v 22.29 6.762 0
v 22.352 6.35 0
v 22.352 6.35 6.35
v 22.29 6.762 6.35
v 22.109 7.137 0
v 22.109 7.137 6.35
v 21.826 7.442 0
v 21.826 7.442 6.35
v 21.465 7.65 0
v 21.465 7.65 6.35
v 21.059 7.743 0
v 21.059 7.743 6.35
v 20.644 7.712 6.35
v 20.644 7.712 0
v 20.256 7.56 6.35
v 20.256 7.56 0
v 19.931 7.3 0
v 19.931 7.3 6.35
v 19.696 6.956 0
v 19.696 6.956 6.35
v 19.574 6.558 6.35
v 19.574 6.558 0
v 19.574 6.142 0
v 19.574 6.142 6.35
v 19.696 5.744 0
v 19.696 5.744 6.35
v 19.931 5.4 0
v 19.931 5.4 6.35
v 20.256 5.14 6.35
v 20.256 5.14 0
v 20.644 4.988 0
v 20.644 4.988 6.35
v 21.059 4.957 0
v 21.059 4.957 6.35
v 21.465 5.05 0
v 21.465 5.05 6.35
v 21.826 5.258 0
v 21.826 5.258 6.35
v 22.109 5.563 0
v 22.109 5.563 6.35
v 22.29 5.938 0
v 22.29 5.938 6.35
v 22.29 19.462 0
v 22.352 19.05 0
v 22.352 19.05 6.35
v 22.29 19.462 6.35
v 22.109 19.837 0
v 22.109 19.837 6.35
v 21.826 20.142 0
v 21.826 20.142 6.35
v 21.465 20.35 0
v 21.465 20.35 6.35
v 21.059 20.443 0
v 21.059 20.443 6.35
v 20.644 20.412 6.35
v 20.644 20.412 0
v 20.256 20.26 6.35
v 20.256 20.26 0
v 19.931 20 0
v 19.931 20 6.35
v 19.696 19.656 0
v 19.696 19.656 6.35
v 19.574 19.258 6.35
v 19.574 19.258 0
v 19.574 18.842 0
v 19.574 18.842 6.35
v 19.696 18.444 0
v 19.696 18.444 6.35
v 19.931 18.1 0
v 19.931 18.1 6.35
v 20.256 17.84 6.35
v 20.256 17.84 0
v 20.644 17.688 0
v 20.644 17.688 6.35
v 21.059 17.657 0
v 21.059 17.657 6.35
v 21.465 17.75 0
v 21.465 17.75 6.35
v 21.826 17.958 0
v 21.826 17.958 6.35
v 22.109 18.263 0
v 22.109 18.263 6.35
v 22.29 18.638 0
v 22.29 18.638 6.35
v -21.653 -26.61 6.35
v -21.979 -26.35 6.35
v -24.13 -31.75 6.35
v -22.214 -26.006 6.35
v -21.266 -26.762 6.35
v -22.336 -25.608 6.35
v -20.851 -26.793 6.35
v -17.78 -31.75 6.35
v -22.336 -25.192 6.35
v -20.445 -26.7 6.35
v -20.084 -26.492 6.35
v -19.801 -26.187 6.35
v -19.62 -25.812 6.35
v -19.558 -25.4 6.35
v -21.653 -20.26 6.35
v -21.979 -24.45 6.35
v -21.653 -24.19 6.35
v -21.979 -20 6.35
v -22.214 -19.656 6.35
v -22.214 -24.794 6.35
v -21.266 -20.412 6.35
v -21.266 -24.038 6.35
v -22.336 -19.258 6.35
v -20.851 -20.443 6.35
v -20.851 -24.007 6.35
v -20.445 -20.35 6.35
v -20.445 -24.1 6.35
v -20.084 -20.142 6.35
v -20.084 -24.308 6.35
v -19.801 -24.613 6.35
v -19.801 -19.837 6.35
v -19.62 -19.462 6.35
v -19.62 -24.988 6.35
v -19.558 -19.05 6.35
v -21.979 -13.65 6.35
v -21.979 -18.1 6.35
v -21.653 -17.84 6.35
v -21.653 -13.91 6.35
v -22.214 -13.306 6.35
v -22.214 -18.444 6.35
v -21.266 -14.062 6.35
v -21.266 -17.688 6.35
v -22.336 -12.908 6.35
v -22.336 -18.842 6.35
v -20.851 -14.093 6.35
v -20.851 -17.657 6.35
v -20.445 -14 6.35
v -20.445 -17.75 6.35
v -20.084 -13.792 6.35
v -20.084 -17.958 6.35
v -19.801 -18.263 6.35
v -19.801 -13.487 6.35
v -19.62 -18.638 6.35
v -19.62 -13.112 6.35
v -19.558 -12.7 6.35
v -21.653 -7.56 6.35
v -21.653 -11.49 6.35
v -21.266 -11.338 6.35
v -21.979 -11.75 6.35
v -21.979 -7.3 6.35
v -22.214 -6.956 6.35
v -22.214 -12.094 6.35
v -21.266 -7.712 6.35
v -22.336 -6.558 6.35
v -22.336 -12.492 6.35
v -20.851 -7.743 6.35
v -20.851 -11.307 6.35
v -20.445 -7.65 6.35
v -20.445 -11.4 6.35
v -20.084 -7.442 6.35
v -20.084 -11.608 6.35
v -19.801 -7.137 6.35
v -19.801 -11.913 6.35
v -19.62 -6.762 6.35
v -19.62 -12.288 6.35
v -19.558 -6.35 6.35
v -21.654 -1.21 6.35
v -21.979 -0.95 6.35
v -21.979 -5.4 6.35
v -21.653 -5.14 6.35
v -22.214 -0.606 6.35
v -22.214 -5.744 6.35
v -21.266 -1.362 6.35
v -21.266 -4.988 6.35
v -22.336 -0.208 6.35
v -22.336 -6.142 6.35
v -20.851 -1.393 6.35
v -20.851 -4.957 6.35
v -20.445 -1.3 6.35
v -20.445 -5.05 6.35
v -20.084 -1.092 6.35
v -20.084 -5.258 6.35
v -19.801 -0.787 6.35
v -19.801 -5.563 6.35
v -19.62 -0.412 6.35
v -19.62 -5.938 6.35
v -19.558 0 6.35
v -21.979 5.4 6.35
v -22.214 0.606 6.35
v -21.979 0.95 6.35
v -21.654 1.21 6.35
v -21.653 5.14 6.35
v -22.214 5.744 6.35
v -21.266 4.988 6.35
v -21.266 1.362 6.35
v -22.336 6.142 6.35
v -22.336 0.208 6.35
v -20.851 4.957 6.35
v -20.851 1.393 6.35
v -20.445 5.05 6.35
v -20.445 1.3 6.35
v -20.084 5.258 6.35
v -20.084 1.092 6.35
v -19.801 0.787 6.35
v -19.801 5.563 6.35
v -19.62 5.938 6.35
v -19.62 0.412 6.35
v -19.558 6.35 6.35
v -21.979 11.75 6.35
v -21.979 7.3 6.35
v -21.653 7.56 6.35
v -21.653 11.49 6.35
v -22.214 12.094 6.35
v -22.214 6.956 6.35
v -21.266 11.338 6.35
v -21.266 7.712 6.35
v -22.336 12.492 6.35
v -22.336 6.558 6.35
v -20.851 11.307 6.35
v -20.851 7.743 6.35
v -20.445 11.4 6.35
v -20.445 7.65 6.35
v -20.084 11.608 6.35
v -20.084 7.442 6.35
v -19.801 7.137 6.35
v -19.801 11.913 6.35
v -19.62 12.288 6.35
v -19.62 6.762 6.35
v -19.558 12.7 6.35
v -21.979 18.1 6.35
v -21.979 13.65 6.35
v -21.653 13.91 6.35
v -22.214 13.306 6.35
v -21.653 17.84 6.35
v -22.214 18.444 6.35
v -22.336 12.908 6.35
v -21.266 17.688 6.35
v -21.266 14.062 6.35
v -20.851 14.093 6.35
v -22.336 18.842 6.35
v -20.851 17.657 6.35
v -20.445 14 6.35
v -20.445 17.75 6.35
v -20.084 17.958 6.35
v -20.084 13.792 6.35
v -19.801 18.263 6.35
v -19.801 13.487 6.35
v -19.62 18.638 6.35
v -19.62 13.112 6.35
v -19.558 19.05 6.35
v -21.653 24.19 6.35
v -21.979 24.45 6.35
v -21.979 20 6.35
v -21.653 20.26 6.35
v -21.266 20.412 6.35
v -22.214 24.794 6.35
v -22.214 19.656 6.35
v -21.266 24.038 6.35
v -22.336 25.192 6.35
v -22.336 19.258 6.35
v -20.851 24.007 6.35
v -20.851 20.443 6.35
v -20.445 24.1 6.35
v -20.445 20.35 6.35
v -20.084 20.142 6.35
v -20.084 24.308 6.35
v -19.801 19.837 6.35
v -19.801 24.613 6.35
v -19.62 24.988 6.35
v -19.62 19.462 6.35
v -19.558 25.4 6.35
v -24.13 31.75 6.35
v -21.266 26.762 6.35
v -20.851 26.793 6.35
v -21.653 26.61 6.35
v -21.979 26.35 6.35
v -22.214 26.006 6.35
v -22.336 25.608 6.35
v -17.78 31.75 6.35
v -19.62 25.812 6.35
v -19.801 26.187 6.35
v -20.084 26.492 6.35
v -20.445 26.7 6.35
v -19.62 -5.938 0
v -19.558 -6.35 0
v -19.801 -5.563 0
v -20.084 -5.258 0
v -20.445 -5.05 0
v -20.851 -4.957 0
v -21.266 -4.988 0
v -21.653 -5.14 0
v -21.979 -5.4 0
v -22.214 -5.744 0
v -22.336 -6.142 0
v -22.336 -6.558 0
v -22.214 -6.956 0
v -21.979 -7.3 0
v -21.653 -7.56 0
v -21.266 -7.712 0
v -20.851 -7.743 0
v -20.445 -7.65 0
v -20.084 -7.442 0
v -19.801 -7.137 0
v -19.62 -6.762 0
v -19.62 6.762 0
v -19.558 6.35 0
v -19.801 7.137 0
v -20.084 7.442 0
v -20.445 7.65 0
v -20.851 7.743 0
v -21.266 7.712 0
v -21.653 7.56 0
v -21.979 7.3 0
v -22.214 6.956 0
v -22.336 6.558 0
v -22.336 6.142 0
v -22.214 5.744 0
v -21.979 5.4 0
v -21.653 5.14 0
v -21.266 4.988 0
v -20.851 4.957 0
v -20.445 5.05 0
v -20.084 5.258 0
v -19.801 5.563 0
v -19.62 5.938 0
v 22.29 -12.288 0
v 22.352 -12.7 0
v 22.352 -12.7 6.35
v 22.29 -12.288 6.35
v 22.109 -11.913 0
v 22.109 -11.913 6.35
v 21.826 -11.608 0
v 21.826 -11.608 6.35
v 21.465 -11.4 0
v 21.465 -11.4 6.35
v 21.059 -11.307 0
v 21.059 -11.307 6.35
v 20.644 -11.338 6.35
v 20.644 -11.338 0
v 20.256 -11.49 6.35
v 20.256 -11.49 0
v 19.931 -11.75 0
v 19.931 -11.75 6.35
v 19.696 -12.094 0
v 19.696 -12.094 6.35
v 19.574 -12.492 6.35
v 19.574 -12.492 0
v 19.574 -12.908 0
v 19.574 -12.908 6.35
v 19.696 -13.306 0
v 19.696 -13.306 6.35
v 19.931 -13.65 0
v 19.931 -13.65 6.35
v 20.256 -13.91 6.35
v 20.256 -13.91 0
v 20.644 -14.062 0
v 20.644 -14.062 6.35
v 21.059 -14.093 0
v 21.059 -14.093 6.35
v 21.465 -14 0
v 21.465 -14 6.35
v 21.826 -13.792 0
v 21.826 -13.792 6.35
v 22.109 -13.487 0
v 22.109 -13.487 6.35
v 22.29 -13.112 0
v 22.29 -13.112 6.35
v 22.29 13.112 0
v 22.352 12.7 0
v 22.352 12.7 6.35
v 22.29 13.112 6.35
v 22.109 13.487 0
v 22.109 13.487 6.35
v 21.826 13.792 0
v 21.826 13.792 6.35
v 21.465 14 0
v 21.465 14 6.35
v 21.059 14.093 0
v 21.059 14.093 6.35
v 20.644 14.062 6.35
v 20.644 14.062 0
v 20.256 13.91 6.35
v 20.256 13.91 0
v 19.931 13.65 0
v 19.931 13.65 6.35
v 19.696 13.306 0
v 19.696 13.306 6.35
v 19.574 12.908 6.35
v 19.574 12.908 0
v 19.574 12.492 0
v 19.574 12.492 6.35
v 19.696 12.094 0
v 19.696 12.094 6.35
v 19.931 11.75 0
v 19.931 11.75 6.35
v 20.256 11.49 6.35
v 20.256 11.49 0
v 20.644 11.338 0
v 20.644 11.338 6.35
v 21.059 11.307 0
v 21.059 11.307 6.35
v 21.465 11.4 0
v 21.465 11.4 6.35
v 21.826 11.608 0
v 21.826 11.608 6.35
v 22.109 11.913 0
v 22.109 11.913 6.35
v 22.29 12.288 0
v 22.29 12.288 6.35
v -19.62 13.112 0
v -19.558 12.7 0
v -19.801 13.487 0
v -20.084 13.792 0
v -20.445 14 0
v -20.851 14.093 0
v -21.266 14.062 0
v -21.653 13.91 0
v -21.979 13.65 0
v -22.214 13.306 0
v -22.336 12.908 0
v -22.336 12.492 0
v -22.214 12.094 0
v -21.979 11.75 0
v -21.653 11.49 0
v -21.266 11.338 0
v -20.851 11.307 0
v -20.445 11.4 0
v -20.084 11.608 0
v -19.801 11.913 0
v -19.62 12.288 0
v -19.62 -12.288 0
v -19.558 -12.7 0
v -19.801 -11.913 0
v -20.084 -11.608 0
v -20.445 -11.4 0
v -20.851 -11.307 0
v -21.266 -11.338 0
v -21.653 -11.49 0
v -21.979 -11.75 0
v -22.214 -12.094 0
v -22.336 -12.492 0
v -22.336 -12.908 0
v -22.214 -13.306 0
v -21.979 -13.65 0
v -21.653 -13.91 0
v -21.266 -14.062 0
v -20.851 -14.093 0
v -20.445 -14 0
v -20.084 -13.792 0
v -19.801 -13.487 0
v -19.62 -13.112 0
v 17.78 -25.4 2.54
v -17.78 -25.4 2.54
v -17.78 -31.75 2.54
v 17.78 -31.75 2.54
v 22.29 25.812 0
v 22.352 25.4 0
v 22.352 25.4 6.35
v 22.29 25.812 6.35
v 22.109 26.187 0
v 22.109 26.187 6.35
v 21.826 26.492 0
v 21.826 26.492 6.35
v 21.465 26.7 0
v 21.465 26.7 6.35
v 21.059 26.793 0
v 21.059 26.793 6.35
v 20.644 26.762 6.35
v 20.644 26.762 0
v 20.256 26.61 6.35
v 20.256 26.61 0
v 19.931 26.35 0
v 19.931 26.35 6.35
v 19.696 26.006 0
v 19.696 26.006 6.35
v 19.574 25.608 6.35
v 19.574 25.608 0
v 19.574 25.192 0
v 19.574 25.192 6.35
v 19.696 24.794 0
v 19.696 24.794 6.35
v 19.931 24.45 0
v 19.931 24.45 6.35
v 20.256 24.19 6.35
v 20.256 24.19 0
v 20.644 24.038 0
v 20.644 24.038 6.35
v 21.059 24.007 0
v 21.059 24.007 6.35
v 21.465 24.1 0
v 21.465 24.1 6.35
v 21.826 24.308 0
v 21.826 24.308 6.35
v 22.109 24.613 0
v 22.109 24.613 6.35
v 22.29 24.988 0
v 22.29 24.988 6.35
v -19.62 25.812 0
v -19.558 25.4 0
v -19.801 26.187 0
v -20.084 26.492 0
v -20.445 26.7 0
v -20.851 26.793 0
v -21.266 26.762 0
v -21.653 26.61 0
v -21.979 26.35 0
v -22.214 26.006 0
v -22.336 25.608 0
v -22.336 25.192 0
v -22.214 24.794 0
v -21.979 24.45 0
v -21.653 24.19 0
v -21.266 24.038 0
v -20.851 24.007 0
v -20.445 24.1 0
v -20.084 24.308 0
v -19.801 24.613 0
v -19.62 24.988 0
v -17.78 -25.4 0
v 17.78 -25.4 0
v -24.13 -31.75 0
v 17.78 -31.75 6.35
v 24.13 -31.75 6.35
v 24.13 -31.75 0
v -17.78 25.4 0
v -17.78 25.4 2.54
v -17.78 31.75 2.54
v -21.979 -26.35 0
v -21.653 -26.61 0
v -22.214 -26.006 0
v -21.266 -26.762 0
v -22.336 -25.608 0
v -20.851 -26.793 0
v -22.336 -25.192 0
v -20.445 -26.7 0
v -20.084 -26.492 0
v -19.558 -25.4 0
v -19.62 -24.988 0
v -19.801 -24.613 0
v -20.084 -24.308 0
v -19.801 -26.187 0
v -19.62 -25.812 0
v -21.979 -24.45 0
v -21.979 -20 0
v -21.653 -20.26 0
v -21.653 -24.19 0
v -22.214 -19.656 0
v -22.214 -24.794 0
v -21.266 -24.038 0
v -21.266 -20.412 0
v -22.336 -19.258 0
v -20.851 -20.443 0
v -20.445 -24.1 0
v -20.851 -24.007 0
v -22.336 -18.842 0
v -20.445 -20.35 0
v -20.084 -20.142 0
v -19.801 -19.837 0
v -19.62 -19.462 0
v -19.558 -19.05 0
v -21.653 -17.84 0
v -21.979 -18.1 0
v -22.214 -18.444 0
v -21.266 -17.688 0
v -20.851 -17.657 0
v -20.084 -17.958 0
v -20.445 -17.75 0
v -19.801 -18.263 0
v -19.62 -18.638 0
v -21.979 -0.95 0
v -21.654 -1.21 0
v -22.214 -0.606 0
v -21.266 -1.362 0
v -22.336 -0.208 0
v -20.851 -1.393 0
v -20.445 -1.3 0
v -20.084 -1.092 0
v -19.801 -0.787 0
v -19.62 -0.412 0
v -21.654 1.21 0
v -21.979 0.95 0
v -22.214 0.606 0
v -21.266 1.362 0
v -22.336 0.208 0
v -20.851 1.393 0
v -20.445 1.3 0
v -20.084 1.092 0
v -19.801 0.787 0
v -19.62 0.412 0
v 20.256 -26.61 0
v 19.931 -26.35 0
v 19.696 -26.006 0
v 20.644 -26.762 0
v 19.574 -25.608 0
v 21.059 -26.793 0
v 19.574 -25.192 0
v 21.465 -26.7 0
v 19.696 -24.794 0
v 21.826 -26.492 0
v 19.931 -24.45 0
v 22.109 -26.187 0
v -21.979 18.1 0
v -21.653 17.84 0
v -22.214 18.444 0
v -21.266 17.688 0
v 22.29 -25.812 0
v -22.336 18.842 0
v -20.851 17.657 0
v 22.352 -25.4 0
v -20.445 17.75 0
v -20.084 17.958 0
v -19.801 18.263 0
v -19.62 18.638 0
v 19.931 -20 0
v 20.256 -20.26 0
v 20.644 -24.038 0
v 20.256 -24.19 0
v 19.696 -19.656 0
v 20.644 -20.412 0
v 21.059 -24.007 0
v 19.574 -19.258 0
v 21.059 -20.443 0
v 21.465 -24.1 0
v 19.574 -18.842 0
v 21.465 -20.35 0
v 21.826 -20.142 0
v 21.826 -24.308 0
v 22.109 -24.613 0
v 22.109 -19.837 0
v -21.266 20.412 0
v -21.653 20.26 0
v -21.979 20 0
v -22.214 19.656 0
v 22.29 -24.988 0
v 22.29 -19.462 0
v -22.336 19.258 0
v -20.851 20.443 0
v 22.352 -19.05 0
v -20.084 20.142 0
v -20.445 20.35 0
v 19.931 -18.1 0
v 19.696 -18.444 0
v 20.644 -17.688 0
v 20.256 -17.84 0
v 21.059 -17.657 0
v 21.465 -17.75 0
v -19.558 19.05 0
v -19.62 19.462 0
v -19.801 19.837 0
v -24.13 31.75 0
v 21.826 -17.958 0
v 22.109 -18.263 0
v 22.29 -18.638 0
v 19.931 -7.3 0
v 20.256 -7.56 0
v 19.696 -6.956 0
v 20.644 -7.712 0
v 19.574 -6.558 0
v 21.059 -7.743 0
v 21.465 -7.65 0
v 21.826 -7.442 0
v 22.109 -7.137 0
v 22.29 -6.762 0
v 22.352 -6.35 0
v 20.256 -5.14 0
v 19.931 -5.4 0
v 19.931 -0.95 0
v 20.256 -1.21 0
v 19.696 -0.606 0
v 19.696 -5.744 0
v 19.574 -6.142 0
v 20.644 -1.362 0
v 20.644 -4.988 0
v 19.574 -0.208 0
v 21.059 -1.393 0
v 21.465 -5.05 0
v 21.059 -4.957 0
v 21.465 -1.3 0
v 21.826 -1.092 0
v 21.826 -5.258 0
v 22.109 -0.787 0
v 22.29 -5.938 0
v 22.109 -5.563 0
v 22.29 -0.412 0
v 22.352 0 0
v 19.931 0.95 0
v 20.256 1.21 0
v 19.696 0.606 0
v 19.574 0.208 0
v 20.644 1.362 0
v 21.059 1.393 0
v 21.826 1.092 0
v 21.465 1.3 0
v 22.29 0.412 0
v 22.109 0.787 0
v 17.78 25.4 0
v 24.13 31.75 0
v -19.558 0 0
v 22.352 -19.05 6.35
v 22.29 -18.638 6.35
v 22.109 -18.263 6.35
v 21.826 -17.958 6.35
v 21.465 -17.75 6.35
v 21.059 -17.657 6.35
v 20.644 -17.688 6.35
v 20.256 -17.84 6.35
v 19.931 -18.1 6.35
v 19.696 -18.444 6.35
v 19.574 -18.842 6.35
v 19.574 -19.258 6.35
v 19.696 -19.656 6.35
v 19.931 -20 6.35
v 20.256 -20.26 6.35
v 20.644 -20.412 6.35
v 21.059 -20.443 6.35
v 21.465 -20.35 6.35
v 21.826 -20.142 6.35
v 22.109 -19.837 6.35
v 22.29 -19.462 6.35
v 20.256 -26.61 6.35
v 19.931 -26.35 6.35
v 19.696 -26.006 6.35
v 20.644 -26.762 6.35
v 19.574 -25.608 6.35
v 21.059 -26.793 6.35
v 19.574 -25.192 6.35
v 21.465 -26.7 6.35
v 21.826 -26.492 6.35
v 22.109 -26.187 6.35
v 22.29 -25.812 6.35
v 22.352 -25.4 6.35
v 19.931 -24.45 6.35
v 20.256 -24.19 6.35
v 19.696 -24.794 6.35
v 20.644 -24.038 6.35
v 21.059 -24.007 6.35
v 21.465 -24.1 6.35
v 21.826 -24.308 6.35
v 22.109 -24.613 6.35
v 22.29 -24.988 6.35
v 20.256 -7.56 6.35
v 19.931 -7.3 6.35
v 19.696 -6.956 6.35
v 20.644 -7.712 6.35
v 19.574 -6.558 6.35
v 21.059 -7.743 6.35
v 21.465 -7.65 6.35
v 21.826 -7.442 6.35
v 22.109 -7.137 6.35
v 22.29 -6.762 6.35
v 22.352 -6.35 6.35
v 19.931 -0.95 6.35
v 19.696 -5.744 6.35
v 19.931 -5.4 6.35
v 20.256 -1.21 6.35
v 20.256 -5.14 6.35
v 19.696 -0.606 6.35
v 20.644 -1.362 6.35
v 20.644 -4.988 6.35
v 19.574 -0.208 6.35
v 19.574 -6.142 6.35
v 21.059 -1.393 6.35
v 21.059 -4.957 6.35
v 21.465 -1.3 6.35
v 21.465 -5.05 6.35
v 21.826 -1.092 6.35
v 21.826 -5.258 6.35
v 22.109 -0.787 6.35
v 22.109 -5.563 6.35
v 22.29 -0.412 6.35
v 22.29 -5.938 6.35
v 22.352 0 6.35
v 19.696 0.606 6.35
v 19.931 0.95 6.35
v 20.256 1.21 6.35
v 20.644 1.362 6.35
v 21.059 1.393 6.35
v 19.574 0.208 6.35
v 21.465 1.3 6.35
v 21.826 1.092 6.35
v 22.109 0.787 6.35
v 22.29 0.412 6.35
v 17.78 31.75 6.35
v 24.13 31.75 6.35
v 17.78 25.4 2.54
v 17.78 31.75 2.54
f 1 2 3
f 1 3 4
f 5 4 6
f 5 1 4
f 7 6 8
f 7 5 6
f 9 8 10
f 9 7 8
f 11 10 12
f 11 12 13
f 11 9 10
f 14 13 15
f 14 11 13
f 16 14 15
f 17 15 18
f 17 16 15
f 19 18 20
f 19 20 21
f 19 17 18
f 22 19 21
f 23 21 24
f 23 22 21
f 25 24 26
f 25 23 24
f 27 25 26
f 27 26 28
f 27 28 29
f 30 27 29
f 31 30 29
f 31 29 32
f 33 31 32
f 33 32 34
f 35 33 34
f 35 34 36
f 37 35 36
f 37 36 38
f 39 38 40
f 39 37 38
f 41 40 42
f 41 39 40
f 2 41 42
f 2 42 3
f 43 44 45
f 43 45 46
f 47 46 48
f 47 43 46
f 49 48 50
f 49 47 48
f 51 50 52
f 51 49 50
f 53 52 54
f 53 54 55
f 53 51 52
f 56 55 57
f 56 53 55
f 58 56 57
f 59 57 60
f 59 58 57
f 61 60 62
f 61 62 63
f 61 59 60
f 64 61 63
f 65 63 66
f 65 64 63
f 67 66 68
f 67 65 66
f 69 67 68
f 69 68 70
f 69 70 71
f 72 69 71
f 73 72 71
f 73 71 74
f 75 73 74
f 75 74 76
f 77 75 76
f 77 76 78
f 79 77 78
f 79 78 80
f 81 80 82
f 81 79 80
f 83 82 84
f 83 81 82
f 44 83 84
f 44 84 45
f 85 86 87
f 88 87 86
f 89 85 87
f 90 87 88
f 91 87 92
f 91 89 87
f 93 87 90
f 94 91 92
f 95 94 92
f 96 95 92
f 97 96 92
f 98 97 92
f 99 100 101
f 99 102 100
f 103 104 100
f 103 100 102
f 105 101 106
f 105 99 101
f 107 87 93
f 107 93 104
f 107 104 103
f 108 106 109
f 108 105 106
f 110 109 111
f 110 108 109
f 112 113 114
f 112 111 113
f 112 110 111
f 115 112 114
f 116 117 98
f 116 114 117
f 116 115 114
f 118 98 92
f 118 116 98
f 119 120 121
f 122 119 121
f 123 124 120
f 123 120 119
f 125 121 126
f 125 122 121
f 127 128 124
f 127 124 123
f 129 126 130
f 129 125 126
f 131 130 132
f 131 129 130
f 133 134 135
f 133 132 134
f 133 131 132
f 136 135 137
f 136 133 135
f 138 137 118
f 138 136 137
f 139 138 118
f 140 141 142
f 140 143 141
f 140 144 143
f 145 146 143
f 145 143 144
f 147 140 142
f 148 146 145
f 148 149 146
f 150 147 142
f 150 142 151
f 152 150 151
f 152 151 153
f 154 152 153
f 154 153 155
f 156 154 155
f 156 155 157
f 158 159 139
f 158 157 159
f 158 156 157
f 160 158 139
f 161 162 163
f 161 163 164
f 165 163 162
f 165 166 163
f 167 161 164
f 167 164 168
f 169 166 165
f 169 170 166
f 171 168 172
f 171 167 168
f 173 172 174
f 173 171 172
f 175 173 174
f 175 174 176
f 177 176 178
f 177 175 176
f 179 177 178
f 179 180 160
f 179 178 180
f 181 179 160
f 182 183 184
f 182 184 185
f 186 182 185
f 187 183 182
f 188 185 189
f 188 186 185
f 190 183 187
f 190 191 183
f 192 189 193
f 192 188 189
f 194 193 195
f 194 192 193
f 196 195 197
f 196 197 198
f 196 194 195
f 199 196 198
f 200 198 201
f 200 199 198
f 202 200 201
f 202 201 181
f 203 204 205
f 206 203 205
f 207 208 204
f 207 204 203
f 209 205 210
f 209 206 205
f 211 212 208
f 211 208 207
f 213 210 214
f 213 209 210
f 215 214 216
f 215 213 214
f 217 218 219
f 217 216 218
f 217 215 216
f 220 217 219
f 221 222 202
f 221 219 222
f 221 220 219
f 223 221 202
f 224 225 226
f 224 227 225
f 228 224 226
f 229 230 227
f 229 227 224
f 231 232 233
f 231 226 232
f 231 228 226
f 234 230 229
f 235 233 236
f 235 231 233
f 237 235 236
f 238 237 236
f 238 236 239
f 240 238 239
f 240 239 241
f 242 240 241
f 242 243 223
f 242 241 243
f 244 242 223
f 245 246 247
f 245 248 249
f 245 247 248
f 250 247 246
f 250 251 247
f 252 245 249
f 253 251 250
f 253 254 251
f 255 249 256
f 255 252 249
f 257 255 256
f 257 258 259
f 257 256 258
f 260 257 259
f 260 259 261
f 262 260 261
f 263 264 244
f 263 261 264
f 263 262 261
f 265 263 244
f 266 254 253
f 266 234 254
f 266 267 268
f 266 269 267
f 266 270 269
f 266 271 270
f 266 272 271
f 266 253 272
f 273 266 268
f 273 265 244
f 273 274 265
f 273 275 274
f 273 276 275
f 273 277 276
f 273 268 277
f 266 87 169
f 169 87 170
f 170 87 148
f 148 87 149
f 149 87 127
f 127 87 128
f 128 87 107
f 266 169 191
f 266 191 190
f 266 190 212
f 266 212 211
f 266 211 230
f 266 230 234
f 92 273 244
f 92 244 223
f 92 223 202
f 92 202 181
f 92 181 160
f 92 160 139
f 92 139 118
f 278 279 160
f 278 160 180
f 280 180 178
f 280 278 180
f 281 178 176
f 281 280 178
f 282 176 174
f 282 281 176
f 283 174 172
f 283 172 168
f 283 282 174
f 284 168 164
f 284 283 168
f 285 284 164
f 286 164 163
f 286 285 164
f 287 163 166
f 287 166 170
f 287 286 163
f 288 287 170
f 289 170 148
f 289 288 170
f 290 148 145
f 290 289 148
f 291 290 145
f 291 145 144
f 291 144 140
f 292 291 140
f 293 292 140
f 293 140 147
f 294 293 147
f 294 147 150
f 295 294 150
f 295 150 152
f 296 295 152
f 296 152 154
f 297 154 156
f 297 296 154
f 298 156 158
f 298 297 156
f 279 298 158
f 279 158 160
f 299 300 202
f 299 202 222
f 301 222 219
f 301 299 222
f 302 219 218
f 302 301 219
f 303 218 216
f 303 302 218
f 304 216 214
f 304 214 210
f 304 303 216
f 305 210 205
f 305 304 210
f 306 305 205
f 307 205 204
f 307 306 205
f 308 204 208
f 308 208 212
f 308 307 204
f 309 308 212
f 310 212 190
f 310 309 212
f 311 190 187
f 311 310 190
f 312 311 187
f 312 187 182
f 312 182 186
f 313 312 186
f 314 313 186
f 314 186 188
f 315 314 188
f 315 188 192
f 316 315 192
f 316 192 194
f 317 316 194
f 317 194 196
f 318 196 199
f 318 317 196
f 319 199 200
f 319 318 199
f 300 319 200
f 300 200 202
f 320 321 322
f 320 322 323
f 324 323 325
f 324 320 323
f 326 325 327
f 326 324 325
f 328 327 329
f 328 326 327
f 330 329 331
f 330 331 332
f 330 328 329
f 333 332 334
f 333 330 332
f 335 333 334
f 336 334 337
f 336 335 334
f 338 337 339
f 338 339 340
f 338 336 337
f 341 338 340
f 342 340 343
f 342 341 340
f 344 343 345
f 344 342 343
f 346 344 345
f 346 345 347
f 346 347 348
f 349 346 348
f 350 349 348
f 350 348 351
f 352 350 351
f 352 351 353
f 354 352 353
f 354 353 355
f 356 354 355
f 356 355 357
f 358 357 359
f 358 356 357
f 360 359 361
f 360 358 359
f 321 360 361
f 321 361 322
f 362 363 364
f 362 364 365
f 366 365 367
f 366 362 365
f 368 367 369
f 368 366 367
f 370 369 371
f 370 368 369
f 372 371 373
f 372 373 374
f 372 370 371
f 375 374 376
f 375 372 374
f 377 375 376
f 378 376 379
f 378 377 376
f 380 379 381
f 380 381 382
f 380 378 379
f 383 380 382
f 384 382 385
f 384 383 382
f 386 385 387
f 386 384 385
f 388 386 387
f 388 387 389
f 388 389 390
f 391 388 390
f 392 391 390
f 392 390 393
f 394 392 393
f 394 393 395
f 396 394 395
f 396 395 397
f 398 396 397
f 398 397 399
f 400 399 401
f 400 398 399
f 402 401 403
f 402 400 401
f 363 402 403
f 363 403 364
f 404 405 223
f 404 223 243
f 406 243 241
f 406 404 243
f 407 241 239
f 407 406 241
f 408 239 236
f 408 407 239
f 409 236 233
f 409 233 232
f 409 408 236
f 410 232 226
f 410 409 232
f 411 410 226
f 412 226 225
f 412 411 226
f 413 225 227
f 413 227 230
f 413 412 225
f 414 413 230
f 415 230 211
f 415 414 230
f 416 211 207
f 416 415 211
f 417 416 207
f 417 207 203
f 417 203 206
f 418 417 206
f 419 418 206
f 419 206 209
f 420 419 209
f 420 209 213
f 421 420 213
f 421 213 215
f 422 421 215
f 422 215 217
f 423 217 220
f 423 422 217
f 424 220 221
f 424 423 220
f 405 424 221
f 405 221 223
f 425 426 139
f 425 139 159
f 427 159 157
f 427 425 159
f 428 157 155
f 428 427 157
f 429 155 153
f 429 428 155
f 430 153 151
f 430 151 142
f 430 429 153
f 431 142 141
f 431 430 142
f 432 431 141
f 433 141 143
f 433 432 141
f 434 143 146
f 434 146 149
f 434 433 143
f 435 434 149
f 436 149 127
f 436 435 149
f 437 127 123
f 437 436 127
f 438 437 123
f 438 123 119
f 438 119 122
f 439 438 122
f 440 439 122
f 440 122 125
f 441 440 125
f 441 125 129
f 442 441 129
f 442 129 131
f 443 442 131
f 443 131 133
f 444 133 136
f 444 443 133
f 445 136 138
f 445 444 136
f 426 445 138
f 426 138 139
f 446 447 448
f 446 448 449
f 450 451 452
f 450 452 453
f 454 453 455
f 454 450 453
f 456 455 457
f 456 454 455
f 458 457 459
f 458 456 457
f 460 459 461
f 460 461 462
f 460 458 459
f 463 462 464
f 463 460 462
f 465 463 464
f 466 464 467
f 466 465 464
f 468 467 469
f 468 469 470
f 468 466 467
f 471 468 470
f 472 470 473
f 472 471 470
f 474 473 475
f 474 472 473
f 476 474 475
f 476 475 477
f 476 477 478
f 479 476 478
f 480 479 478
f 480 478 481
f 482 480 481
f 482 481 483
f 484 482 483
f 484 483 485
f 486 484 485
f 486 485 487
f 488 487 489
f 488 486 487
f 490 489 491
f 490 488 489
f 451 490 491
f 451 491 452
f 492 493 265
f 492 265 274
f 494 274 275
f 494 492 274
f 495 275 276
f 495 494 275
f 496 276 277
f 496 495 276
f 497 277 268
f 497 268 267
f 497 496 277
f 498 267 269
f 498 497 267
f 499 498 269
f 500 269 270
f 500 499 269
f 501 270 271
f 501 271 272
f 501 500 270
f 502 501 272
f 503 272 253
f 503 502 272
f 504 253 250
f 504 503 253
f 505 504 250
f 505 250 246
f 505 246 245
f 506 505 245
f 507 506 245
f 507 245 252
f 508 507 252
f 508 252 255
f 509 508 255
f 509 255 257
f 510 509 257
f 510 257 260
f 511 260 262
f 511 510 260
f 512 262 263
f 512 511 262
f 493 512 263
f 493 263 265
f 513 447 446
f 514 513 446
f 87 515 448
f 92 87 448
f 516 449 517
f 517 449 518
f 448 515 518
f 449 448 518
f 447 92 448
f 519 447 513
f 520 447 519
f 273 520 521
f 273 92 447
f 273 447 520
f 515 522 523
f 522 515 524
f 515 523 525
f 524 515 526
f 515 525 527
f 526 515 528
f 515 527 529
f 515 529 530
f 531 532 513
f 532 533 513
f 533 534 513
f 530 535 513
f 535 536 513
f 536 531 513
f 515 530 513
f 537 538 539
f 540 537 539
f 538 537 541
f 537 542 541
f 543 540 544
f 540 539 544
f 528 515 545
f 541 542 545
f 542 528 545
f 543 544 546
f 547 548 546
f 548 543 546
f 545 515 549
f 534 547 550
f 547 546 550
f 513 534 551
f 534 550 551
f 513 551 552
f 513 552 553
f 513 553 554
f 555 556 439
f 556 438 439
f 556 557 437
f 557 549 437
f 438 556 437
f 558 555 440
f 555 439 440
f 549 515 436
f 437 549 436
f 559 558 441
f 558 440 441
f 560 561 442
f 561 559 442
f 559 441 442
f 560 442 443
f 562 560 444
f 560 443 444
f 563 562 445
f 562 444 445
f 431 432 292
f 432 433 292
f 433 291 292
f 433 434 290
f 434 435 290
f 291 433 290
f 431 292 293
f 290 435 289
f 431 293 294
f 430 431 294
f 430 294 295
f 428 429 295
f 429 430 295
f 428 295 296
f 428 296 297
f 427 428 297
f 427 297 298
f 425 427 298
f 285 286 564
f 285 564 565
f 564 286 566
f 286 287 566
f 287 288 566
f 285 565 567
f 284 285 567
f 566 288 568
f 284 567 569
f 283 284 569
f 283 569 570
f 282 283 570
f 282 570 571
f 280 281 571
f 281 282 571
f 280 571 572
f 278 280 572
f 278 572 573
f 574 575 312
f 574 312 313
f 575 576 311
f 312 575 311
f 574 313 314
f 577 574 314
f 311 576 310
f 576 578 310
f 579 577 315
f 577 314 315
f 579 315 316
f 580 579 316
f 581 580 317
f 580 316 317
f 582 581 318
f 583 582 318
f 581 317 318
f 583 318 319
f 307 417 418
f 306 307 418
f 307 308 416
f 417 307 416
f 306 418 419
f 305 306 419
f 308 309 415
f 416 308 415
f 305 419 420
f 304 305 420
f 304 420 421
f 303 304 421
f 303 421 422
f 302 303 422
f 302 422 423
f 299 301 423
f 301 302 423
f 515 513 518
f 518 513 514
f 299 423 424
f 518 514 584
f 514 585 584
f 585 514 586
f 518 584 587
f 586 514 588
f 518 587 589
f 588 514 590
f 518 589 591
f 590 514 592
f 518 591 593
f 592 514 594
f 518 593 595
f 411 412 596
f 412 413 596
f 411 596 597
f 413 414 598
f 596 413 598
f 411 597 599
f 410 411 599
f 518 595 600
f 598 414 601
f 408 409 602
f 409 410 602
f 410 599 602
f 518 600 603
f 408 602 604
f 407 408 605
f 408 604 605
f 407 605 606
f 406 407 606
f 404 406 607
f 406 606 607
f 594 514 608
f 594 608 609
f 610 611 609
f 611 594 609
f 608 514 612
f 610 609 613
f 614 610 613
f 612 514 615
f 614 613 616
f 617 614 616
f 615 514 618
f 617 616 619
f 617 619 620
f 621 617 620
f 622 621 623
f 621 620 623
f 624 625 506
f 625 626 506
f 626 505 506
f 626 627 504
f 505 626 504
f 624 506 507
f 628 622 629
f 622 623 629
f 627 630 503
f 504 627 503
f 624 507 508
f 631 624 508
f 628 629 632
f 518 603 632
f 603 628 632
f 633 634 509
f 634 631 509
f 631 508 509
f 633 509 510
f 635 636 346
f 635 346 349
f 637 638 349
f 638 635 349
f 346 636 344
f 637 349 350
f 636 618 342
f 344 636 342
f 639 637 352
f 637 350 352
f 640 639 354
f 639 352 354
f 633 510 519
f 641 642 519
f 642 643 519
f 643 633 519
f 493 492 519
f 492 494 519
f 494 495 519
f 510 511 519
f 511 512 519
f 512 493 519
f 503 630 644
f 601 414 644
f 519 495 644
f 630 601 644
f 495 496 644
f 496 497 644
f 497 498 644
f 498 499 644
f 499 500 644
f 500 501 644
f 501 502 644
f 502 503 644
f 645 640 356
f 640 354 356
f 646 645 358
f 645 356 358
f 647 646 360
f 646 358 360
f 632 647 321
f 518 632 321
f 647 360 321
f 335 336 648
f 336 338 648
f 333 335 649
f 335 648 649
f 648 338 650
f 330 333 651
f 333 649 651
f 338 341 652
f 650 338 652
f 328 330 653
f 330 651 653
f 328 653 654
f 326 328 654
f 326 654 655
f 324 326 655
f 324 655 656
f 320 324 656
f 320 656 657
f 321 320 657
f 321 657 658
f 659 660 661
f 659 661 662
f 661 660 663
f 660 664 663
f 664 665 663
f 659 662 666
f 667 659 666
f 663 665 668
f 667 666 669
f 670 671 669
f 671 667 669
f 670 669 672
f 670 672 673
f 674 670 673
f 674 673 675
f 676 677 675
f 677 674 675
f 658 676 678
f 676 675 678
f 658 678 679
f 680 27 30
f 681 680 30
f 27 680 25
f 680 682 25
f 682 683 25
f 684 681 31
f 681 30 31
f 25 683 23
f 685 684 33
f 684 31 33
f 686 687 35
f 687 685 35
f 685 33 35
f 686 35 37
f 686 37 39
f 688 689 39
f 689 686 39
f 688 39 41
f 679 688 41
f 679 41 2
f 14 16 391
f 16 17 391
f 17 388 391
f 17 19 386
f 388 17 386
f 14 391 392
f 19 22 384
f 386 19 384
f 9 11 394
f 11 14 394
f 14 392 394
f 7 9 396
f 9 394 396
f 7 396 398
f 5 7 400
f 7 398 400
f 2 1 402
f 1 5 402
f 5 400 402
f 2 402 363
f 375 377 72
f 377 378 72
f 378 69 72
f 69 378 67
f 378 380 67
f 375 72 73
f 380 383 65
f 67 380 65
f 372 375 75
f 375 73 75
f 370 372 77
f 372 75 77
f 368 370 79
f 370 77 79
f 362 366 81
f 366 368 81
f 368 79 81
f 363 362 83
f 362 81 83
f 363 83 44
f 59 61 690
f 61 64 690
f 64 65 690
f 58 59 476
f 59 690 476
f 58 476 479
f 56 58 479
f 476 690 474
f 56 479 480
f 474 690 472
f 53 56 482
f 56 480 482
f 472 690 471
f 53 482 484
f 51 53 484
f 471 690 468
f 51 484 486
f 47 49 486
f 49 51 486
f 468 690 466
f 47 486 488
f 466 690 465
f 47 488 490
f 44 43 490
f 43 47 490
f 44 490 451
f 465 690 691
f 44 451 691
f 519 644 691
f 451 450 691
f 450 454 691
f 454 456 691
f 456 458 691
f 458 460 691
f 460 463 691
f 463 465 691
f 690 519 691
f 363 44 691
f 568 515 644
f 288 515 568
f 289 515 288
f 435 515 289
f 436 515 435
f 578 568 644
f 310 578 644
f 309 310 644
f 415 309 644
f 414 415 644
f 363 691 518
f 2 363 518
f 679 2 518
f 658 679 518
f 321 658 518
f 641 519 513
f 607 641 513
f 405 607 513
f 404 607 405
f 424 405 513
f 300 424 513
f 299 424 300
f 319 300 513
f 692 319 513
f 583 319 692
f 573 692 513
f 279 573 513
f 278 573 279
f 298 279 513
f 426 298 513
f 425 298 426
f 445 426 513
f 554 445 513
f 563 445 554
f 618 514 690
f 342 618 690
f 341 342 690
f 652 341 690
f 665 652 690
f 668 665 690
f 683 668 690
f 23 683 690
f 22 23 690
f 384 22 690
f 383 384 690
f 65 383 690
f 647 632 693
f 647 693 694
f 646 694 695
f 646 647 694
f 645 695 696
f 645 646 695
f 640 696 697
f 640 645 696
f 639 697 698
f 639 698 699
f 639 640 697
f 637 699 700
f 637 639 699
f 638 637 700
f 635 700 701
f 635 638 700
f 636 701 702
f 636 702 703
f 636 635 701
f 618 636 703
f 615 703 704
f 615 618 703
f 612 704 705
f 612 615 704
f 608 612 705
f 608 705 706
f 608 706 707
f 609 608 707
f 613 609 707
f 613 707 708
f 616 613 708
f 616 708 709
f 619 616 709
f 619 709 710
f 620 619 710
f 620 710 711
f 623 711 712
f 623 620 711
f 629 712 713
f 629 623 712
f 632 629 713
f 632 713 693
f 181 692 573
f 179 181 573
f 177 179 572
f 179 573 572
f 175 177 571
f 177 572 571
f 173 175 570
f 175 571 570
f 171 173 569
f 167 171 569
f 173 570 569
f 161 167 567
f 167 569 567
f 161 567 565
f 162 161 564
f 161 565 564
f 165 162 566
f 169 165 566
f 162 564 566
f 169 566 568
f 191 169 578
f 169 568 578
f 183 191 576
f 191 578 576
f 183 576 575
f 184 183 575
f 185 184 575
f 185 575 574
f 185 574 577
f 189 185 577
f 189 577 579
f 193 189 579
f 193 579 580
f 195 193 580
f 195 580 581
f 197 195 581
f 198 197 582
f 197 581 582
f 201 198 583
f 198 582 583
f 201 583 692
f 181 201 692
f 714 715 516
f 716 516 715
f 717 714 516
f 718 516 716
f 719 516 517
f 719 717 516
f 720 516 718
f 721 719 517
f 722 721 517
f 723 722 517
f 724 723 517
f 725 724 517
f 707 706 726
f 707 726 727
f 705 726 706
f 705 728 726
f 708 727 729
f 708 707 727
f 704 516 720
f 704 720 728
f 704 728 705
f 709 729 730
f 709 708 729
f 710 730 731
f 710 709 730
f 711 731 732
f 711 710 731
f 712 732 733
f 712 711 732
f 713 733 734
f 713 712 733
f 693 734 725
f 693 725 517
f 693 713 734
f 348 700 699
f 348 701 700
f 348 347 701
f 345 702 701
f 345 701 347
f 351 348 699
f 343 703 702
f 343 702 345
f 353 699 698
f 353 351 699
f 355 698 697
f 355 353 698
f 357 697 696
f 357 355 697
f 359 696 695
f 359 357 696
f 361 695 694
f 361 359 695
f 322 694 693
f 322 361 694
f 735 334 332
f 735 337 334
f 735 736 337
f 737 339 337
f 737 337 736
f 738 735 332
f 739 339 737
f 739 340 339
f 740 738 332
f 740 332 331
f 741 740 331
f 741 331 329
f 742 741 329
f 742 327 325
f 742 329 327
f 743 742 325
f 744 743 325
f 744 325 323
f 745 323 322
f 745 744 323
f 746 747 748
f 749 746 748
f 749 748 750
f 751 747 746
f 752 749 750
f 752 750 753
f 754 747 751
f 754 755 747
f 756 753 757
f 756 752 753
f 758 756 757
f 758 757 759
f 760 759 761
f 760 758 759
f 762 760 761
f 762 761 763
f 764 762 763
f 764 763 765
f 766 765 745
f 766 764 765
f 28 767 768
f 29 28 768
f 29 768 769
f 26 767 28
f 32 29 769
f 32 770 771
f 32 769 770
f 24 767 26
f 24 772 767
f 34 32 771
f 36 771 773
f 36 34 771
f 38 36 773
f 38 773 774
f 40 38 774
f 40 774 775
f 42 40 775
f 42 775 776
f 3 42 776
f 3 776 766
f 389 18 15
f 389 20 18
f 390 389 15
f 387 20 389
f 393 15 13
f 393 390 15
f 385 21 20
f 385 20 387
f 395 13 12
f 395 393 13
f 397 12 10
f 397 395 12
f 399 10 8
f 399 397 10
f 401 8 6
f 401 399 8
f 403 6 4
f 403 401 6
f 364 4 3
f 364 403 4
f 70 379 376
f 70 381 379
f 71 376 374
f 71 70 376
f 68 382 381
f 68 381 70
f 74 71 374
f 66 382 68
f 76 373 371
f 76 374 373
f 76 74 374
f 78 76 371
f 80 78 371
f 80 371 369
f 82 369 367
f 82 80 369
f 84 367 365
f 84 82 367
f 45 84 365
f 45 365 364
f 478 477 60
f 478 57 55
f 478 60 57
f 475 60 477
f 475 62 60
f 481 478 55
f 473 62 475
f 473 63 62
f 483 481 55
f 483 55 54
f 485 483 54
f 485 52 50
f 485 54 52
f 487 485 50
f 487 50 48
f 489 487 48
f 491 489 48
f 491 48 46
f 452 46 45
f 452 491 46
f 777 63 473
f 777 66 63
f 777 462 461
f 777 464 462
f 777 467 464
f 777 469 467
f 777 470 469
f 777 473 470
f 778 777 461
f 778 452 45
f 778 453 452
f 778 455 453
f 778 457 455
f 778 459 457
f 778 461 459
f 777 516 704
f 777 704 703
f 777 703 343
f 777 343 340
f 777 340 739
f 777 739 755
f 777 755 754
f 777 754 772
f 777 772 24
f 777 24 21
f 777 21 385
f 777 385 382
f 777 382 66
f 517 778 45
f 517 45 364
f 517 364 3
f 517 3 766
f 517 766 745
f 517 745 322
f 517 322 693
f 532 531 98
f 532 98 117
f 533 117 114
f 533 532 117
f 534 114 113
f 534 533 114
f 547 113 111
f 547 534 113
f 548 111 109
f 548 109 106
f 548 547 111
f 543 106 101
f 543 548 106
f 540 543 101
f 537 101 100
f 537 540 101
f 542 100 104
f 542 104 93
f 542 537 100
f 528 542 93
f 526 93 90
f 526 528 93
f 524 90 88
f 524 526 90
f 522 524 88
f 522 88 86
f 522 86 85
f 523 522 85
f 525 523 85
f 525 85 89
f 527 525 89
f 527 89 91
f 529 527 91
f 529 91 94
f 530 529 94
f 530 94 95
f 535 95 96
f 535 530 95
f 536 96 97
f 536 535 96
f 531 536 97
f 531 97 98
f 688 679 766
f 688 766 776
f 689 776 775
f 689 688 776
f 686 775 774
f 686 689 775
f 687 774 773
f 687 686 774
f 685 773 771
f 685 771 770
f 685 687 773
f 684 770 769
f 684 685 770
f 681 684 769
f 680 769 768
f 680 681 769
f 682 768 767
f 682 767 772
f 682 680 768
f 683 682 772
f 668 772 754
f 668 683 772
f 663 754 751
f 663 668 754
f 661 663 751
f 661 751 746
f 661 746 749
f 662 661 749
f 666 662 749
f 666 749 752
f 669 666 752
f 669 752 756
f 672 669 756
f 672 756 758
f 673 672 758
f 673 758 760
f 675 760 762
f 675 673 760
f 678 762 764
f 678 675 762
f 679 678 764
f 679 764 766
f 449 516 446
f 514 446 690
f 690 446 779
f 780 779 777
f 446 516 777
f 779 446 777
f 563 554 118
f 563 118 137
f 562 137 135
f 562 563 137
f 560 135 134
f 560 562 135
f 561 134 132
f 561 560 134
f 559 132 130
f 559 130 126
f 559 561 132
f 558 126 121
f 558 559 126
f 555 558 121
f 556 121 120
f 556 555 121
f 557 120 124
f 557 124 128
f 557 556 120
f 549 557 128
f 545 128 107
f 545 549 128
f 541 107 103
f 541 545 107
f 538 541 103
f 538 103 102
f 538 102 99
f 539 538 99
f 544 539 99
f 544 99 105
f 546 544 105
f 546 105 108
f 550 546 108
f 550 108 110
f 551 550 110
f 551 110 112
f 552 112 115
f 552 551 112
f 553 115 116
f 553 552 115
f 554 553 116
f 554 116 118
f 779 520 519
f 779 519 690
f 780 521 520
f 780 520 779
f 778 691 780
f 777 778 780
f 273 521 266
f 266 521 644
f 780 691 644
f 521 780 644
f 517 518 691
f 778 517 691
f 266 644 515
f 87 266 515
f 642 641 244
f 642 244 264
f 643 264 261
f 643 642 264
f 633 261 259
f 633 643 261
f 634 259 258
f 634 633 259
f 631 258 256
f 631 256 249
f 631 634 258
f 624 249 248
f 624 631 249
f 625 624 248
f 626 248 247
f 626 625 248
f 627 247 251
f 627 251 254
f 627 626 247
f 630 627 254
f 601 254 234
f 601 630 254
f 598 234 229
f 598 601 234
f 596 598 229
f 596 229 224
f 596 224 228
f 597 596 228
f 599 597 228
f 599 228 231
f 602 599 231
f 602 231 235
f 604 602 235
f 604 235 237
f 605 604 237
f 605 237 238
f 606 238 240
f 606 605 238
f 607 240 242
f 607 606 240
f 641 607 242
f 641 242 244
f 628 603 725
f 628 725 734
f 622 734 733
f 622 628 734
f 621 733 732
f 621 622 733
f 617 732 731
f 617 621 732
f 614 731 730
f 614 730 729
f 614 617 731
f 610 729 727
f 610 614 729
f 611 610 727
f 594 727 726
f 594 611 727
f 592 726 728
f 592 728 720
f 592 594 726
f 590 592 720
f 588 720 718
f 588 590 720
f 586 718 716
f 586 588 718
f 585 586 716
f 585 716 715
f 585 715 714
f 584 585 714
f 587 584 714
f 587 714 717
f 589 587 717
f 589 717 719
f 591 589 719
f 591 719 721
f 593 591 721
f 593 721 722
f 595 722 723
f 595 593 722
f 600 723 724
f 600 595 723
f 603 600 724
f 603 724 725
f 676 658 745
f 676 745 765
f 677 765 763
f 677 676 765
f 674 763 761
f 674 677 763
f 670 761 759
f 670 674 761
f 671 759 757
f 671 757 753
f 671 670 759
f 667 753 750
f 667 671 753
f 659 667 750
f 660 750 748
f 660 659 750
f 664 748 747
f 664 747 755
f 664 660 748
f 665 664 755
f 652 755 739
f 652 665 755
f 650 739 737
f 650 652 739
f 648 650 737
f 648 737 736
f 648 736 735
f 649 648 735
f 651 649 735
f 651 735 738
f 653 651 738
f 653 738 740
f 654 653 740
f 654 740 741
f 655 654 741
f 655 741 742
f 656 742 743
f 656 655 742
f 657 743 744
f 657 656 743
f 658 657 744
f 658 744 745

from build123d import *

# Parameters (mm, degrees)
F0_R     = 1.397
F1_DEPTH = 6.35
F2_W     = 35.56
F2_H     = 63.5
F3_DEPTH = 3.81
F4_W     = 35.56
F4_H     = 50.8
F5_DEPTH = 25.4


with BuildPart() as f1:
    # F0 (on Top) → F1 (new body)
    with BuildSketch(Plane.XY):
        with BuildLine():
            ThreePointArc((-22.352, 0), (-20.955, -1.397), (-19.558, 0))
            ThreePointArc((-19.558, 0), (-20.955, 1.397), (-22.352, 0))
        make_face()
        Polygon((-24.13, 31.75), (-24.13, 0), (-24.13, -31.75), (-17.78, -31.75), (17.78, -31.75), (24.13, -31.75), (24.13, 31.75), (17.78, 31.75), (-17.78, 31.75), align=None)
        with Locations((-20.955, -25.4)):
            Circle(F0_R, mode=Mode.SUBTRACT)
        with Locations((-20.955, -19.05)):
            Circle(F0_R, mode=Mode.SUBTRACT)
        with Locations((-20.955, -12.7)):
            Circle(F0_R, mode=Mode.SUBTRACT)
        with Locations((-20.955, -6.35)):
            Circle(F0_R, mode=Mode.SUBTRACT)
        with Locations((20.955, -25.4)):
            Circle(F0_R, mode=Mode.SUBTRACT)
        with Locations((20.955, -19.05)):
            Circle(F0_R, mode=Mode.SUBTRACT)
        with Locations((20.955, -12.7)):
            Circle(F0_R, mode=Mode.SUBTRACT)
        with Locations((20.955, -6.35)):
            Circle(F0_R, mode=Mode.SUBTRACT)
        with BuildLine():
            ThreePointArc((-22.352, 0), (-20.955, 1.397), (-19.558, 0))
            ThreePointArc((-19.558, 0), (-20.955, -1.397), (-22.352, 0))
        make_face(mode=Mode.SUBTRACT)
        with Locations((-20.955, 6.35)):
            Circle(F0_R, mode=Mode.SUBTRACT)
        with Locations((-20.955, 12.7)):
            Circle(F0_R, mode=Mode.SUBTRACT)
        with Locations((-20.955, 19.05)):
            Circle(F0_R, mode=Mode.SUBTRACT)
        with Locations((-20.955, 25.4)):
            Circle(F0_R, mode=Mode.SUBTRACT)
        with Locations((20.955, 0)):
            Circle(F0_R, mode=Mode.SUBTRACT)
        with Locations((20.955, 6.35)):
            Circle(F0_R, mode=Mode.SUBTRACT)
        with Locations((20.955, 12.7)):
            Circle(F0_R, mode=Mode.SUBTRACT)
        with Locations((20.955, 19.05)):
            Circle(F0_R, mode=Mode.SUBTRACT)
        with Locations((20.955, 25.4)):
            Circle(F0_R, mode=Mode.SUBTRACT)
    extrude(amount=F1_DEPTH)

    # F2 (on face) → F3 (cut)
    with BuildSketch(Plane.XY.offset(6.35)):
        Rectangle(F2_W, F2_H)
    extrude(amount=-F3_DEPTH, mode=Mode.SUBTRACT)

    # F4 (on face) → F5 (cut)
    with BuildSketch(Plane.XY.offset(2.54)):
        Rectangle(F4_W, F4_H)
    extrude(amount=-F5_DEPTH, mode=Mode.SUBTRACT)


solid = f1.part
